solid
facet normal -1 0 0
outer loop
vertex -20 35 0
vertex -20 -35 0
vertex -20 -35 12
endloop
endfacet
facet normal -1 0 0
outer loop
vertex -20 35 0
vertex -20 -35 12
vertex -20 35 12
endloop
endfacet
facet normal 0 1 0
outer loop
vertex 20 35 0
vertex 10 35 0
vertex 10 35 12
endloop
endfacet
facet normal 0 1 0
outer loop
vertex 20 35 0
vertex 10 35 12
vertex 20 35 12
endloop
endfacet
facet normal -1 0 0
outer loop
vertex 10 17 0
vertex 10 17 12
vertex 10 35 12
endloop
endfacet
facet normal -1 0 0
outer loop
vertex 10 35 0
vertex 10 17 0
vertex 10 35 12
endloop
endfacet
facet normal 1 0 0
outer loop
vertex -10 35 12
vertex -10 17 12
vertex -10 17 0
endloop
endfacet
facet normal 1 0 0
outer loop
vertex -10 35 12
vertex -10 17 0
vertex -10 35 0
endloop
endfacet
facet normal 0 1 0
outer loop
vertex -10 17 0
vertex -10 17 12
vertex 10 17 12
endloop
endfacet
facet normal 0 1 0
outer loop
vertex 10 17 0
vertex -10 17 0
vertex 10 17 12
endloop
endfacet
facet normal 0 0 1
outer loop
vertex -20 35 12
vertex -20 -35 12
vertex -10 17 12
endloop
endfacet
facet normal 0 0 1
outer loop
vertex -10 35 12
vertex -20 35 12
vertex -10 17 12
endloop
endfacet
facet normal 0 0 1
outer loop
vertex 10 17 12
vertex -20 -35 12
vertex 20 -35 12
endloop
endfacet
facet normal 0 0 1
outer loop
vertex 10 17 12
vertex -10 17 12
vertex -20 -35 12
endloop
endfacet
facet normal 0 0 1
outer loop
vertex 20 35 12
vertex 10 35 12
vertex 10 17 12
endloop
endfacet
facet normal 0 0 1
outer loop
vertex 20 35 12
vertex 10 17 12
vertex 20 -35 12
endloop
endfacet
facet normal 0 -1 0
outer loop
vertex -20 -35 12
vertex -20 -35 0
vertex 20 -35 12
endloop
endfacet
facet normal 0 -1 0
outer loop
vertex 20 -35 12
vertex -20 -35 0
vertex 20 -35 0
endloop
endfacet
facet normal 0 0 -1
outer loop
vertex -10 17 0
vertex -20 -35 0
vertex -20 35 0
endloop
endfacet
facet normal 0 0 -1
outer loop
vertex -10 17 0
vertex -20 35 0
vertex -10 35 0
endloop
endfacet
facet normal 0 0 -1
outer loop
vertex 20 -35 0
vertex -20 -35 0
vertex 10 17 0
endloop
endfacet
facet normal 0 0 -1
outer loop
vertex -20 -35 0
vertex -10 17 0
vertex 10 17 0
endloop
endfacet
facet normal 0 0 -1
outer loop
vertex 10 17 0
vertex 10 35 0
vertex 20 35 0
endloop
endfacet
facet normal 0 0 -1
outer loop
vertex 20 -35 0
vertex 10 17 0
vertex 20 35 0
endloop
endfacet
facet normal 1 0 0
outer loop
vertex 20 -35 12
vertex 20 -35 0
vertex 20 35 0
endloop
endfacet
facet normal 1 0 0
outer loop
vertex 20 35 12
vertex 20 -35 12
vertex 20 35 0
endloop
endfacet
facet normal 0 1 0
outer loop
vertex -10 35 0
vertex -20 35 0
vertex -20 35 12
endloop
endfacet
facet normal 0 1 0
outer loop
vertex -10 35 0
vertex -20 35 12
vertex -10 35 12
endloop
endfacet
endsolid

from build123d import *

# Parameters (mm, degrees)
SZKIC1_W                    = 40
SZKIC1_H                    = 70
DODANIE_WYCI_GNI_CIE1_DEPTH = 12
SZKIC2_W                    = 20
SZKIC2_H                    = 18
WYTNIJ_WYCI_GNI_CIE1_DEPTH  = 43.05948169


with BuildPart() as part:
    # Szkic1 → Dodanie-wyciągnięcie1 (new body)
    with BuildSketch(Plane.XY):
        Rectangle(SZKIC1_W, SZKIC1_H)
    extrude(amount=DODANIE_WYCI_GNI_CIE1_DEPTH)

    # Szkic2 → Wytnij-wyciągnięcie1 (cut, through all)
    with BuildSketch(Plane.XY.offset(12)):
        with Locations((0, 26)):
            Rectangle(SZKIC2_W, SZKIC2_H)
    extrude(amount=-WYTNIJ_WYCI_GNI_CIE1_DEPTH, mode=Mode.SUBTRACT)


solid = part.part
